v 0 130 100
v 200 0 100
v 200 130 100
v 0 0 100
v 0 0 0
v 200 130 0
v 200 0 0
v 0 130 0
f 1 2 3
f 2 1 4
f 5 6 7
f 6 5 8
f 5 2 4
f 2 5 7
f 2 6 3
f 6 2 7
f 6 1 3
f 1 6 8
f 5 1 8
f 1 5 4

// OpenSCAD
/*
    Gullickson Laboratories Model One
    (desktop music system)
    
    Heavily inspired (perhaps even a tribute?) to the Henry Kloss/Tivoli
    Model One table radio.
    
    The main unit consists of:
    * A speaker
    * A preamplifier
    * A power amplifier
    * A volume control
    * An input selector switch
    * A line input labled "aux"
    * A phono input
    * 
    
*/

LENGTH = 200;
DEPTH = 130;
HEIGHT = 100;

cube([LENGTH, DEPTH, HEIGHT]);
